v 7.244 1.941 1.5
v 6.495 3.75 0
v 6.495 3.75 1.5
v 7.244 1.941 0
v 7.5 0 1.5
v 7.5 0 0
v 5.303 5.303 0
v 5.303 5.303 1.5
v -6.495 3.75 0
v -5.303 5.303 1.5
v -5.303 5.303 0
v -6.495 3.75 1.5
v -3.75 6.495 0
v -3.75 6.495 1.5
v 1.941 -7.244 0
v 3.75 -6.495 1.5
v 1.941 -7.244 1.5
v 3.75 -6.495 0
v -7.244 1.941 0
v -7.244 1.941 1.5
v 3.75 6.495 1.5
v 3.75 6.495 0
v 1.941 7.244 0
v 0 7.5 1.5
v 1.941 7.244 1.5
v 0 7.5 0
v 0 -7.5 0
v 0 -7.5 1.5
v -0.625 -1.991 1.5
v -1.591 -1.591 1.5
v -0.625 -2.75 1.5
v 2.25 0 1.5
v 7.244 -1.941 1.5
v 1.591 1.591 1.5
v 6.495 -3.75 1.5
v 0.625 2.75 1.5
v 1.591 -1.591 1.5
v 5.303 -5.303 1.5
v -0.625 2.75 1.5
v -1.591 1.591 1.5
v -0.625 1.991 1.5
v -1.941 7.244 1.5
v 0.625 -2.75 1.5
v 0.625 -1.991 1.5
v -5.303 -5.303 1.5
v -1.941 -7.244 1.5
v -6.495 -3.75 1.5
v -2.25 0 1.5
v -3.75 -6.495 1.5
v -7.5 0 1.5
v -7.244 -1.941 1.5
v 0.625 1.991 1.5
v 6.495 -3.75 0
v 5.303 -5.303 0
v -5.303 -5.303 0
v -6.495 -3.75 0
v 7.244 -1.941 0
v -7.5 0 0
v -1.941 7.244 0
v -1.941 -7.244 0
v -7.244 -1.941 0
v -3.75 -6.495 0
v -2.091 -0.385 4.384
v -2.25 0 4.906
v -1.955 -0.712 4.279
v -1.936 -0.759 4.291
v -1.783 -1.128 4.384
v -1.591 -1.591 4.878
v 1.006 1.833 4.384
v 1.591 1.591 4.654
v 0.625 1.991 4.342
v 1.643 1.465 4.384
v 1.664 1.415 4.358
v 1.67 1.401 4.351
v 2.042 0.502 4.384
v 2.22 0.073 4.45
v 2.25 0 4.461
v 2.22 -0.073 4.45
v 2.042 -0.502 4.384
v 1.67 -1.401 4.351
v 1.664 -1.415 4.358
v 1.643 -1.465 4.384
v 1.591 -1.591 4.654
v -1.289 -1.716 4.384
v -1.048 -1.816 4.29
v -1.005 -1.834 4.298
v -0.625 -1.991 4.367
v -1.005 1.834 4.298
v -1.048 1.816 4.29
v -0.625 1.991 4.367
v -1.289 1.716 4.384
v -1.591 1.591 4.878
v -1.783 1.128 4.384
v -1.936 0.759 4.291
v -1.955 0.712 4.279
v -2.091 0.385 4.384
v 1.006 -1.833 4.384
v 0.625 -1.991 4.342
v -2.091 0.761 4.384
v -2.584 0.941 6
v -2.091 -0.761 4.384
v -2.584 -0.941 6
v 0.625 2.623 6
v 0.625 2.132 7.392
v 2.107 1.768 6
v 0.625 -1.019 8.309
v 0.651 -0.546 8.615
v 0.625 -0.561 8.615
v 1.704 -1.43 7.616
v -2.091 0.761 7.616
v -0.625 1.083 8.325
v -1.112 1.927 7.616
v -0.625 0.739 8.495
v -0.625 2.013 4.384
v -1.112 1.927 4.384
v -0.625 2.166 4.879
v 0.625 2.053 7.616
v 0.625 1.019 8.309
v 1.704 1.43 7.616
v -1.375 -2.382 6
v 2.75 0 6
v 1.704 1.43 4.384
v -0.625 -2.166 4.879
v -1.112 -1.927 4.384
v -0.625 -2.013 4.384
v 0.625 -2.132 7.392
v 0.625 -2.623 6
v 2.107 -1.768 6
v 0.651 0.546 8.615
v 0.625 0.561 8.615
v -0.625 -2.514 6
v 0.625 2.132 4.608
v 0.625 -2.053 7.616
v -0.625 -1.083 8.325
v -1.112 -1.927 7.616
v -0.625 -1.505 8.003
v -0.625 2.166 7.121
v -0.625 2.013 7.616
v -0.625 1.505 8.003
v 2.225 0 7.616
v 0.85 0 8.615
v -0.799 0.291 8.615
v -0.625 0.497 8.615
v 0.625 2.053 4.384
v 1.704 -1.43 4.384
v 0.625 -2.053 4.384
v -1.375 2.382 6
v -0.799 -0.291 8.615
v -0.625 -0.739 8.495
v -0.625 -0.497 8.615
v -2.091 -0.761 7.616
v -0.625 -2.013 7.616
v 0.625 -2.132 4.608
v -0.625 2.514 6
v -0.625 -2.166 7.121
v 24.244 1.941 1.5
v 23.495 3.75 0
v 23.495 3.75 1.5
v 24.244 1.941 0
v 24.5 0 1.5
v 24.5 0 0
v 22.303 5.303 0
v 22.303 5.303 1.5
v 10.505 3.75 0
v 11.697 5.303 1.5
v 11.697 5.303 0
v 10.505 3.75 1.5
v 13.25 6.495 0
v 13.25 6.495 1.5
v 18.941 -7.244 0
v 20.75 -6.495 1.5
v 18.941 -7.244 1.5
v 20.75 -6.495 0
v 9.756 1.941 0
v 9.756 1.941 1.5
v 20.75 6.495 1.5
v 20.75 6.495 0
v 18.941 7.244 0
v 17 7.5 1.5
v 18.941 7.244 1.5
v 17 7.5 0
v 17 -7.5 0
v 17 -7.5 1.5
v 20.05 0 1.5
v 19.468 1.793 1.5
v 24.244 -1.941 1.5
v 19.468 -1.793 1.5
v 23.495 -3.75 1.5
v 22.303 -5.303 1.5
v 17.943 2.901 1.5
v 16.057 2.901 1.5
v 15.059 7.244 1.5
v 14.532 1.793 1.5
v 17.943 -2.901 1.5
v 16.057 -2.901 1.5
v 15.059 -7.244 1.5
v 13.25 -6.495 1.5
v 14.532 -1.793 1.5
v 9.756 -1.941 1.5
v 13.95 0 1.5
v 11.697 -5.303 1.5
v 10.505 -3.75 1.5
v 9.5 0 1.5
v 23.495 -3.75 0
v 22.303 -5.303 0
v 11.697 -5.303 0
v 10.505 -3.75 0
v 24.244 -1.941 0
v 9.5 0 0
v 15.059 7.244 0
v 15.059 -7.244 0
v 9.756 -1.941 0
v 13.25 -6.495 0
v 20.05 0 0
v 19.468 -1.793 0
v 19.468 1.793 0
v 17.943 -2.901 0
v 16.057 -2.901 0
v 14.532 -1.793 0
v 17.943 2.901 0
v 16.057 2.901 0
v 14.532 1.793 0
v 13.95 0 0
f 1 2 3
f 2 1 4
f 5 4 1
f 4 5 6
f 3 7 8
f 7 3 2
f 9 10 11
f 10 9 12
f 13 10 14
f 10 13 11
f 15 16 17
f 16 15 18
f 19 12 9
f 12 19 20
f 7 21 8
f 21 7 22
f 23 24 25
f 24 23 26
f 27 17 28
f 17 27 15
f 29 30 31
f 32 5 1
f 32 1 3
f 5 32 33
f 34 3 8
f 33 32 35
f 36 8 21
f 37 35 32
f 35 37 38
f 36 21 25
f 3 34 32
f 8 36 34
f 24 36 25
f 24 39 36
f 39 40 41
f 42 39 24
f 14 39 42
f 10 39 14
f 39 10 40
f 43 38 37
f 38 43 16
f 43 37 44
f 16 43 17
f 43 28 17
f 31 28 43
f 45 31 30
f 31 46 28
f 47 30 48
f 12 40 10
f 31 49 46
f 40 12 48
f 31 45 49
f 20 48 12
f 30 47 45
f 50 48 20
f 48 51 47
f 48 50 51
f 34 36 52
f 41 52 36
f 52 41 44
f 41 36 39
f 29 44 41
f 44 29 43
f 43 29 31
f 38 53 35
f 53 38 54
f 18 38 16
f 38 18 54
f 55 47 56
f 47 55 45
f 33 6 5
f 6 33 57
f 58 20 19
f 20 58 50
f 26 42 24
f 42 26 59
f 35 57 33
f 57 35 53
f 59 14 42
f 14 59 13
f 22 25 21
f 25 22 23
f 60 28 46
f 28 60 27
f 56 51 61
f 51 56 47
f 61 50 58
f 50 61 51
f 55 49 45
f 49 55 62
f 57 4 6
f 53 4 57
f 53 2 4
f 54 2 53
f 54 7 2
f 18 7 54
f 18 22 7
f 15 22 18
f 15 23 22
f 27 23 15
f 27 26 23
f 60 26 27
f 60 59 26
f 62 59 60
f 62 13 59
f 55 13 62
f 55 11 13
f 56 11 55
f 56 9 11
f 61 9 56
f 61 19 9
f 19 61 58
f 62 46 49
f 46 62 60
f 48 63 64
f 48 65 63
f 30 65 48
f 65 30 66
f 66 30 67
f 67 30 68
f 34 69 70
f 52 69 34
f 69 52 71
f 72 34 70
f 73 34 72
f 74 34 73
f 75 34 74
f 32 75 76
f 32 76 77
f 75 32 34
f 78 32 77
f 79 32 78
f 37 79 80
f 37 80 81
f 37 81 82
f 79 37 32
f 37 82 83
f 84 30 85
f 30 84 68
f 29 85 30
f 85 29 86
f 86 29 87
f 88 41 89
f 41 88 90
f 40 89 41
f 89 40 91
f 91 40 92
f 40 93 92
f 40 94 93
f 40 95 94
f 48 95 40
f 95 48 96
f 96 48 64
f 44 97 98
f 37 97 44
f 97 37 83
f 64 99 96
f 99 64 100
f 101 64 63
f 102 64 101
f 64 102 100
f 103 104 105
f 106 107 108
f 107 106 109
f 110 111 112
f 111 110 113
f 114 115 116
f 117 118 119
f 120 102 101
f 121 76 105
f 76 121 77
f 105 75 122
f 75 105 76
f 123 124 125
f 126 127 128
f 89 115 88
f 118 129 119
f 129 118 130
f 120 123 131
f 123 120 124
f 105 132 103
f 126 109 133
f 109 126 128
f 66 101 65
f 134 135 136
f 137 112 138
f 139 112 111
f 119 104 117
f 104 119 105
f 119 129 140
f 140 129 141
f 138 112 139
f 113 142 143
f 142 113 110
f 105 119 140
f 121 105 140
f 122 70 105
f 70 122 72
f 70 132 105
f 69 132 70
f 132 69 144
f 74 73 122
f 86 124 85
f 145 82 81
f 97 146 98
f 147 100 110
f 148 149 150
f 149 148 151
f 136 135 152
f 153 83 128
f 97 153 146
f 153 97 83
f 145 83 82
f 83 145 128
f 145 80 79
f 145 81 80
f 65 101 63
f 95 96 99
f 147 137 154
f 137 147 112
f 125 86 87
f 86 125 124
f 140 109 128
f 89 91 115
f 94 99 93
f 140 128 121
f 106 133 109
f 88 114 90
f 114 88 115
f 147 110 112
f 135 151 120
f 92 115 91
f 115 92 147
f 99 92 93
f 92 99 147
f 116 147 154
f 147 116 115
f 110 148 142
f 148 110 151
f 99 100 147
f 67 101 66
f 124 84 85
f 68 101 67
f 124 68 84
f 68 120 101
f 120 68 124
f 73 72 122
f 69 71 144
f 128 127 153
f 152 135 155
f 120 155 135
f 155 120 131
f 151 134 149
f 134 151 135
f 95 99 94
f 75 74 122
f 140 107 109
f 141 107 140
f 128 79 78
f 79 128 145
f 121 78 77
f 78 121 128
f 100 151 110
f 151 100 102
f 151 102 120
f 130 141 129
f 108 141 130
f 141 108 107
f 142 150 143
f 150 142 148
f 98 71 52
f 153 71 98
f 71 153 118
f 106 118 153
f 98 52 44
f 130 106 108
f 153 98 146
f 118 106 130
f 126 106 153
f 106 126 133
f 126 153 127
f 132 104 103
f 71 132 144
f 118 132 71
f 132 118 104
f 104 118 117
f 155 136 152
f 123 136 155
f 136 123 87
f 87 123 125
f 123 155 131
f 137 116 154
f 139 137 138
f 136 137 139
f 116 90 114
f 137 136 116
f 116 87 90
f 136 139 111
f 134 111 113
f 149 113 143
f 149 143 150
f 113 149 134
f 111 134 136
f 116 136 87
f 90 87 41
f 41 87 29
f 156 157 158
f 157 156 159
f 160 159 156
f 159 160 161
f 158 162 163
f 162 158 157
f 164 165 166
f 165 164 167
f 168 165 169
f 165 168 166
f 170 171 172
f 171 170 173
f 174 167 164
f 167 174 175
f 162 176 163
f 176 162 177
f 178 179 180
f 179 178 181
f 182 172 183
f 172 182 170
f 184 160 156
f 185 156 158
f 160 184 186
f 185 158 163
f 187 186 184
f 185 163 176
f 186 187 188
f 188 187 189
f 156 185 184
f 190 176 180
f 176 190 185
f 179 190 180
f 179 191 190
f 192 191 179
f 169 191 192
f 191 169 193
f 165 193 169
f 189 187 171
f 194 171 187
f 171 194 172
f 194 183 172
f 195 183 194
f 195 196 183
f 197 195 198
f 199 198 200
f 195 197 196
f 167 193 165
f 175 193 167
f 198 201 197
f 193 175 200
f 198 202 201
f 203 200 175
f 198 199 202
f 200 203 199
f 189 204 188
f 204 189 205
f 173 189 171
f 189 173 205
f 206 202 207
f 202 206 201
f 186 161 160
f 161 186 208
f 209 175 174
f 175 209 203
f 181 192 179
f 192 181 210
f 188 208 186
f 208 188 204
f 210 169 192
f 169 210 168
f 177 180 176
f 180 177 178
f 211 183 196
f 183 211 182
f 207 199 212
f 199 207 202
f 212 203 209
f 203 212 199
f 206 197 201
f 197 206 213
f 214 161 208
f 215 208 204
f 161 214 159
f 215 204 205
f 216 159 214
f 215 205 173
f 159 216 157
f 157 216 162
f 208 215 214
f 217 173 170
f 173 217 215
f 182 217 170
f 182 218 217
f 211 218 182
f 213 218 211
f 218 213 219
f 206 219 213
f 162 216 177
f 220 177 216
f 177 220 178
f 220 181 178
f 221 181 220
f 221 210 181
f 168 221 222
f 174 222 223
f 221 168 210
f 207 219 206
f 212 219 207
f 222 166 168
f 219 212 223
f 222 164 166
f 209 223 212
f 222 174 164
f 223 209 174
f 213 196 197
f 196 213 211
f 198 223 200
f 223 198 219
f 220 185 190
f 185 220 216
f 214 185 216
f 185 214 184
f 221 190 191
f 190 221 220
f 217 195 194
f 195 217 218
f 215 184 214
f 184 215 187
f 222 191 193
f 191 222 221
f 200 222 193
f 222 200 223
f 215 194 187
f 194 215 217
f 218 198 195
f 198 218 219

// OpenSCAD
//fastner radius
lR = 7.5;
//hole radius
iR = 2.25;
//fastner height of tags
h = 1.5;
//paper width
pW = 3;
//increment of stopper to fasten
dH=1;

module fastnerPeg(){
difference(){
 union(){
	cylinder(r=lR,h=h);
	translate([0,0,h]) cylinder(r=iR,h=pW+h);
	translate([0,0,2*h+pW]) sphere(r=iR+dH/2);
	}
	translate([-(dH*1.25)/2,-(iR*2+dH)/2,h]) cube([dH*1.25,iR*2+dH,h+pW+iR+dH/2]) ;
}
}

module fastnerWasher(){
	difference(){
		cylinder(r=lR,h=h);
		// increase r if your printer prints smaller holes.
		cylinder(r=iR+dH/2+0.3,h=h);
	}
}

fastnerPeg();

translate([lR *2 + 2,0,0]) 
fastnerWasher();
